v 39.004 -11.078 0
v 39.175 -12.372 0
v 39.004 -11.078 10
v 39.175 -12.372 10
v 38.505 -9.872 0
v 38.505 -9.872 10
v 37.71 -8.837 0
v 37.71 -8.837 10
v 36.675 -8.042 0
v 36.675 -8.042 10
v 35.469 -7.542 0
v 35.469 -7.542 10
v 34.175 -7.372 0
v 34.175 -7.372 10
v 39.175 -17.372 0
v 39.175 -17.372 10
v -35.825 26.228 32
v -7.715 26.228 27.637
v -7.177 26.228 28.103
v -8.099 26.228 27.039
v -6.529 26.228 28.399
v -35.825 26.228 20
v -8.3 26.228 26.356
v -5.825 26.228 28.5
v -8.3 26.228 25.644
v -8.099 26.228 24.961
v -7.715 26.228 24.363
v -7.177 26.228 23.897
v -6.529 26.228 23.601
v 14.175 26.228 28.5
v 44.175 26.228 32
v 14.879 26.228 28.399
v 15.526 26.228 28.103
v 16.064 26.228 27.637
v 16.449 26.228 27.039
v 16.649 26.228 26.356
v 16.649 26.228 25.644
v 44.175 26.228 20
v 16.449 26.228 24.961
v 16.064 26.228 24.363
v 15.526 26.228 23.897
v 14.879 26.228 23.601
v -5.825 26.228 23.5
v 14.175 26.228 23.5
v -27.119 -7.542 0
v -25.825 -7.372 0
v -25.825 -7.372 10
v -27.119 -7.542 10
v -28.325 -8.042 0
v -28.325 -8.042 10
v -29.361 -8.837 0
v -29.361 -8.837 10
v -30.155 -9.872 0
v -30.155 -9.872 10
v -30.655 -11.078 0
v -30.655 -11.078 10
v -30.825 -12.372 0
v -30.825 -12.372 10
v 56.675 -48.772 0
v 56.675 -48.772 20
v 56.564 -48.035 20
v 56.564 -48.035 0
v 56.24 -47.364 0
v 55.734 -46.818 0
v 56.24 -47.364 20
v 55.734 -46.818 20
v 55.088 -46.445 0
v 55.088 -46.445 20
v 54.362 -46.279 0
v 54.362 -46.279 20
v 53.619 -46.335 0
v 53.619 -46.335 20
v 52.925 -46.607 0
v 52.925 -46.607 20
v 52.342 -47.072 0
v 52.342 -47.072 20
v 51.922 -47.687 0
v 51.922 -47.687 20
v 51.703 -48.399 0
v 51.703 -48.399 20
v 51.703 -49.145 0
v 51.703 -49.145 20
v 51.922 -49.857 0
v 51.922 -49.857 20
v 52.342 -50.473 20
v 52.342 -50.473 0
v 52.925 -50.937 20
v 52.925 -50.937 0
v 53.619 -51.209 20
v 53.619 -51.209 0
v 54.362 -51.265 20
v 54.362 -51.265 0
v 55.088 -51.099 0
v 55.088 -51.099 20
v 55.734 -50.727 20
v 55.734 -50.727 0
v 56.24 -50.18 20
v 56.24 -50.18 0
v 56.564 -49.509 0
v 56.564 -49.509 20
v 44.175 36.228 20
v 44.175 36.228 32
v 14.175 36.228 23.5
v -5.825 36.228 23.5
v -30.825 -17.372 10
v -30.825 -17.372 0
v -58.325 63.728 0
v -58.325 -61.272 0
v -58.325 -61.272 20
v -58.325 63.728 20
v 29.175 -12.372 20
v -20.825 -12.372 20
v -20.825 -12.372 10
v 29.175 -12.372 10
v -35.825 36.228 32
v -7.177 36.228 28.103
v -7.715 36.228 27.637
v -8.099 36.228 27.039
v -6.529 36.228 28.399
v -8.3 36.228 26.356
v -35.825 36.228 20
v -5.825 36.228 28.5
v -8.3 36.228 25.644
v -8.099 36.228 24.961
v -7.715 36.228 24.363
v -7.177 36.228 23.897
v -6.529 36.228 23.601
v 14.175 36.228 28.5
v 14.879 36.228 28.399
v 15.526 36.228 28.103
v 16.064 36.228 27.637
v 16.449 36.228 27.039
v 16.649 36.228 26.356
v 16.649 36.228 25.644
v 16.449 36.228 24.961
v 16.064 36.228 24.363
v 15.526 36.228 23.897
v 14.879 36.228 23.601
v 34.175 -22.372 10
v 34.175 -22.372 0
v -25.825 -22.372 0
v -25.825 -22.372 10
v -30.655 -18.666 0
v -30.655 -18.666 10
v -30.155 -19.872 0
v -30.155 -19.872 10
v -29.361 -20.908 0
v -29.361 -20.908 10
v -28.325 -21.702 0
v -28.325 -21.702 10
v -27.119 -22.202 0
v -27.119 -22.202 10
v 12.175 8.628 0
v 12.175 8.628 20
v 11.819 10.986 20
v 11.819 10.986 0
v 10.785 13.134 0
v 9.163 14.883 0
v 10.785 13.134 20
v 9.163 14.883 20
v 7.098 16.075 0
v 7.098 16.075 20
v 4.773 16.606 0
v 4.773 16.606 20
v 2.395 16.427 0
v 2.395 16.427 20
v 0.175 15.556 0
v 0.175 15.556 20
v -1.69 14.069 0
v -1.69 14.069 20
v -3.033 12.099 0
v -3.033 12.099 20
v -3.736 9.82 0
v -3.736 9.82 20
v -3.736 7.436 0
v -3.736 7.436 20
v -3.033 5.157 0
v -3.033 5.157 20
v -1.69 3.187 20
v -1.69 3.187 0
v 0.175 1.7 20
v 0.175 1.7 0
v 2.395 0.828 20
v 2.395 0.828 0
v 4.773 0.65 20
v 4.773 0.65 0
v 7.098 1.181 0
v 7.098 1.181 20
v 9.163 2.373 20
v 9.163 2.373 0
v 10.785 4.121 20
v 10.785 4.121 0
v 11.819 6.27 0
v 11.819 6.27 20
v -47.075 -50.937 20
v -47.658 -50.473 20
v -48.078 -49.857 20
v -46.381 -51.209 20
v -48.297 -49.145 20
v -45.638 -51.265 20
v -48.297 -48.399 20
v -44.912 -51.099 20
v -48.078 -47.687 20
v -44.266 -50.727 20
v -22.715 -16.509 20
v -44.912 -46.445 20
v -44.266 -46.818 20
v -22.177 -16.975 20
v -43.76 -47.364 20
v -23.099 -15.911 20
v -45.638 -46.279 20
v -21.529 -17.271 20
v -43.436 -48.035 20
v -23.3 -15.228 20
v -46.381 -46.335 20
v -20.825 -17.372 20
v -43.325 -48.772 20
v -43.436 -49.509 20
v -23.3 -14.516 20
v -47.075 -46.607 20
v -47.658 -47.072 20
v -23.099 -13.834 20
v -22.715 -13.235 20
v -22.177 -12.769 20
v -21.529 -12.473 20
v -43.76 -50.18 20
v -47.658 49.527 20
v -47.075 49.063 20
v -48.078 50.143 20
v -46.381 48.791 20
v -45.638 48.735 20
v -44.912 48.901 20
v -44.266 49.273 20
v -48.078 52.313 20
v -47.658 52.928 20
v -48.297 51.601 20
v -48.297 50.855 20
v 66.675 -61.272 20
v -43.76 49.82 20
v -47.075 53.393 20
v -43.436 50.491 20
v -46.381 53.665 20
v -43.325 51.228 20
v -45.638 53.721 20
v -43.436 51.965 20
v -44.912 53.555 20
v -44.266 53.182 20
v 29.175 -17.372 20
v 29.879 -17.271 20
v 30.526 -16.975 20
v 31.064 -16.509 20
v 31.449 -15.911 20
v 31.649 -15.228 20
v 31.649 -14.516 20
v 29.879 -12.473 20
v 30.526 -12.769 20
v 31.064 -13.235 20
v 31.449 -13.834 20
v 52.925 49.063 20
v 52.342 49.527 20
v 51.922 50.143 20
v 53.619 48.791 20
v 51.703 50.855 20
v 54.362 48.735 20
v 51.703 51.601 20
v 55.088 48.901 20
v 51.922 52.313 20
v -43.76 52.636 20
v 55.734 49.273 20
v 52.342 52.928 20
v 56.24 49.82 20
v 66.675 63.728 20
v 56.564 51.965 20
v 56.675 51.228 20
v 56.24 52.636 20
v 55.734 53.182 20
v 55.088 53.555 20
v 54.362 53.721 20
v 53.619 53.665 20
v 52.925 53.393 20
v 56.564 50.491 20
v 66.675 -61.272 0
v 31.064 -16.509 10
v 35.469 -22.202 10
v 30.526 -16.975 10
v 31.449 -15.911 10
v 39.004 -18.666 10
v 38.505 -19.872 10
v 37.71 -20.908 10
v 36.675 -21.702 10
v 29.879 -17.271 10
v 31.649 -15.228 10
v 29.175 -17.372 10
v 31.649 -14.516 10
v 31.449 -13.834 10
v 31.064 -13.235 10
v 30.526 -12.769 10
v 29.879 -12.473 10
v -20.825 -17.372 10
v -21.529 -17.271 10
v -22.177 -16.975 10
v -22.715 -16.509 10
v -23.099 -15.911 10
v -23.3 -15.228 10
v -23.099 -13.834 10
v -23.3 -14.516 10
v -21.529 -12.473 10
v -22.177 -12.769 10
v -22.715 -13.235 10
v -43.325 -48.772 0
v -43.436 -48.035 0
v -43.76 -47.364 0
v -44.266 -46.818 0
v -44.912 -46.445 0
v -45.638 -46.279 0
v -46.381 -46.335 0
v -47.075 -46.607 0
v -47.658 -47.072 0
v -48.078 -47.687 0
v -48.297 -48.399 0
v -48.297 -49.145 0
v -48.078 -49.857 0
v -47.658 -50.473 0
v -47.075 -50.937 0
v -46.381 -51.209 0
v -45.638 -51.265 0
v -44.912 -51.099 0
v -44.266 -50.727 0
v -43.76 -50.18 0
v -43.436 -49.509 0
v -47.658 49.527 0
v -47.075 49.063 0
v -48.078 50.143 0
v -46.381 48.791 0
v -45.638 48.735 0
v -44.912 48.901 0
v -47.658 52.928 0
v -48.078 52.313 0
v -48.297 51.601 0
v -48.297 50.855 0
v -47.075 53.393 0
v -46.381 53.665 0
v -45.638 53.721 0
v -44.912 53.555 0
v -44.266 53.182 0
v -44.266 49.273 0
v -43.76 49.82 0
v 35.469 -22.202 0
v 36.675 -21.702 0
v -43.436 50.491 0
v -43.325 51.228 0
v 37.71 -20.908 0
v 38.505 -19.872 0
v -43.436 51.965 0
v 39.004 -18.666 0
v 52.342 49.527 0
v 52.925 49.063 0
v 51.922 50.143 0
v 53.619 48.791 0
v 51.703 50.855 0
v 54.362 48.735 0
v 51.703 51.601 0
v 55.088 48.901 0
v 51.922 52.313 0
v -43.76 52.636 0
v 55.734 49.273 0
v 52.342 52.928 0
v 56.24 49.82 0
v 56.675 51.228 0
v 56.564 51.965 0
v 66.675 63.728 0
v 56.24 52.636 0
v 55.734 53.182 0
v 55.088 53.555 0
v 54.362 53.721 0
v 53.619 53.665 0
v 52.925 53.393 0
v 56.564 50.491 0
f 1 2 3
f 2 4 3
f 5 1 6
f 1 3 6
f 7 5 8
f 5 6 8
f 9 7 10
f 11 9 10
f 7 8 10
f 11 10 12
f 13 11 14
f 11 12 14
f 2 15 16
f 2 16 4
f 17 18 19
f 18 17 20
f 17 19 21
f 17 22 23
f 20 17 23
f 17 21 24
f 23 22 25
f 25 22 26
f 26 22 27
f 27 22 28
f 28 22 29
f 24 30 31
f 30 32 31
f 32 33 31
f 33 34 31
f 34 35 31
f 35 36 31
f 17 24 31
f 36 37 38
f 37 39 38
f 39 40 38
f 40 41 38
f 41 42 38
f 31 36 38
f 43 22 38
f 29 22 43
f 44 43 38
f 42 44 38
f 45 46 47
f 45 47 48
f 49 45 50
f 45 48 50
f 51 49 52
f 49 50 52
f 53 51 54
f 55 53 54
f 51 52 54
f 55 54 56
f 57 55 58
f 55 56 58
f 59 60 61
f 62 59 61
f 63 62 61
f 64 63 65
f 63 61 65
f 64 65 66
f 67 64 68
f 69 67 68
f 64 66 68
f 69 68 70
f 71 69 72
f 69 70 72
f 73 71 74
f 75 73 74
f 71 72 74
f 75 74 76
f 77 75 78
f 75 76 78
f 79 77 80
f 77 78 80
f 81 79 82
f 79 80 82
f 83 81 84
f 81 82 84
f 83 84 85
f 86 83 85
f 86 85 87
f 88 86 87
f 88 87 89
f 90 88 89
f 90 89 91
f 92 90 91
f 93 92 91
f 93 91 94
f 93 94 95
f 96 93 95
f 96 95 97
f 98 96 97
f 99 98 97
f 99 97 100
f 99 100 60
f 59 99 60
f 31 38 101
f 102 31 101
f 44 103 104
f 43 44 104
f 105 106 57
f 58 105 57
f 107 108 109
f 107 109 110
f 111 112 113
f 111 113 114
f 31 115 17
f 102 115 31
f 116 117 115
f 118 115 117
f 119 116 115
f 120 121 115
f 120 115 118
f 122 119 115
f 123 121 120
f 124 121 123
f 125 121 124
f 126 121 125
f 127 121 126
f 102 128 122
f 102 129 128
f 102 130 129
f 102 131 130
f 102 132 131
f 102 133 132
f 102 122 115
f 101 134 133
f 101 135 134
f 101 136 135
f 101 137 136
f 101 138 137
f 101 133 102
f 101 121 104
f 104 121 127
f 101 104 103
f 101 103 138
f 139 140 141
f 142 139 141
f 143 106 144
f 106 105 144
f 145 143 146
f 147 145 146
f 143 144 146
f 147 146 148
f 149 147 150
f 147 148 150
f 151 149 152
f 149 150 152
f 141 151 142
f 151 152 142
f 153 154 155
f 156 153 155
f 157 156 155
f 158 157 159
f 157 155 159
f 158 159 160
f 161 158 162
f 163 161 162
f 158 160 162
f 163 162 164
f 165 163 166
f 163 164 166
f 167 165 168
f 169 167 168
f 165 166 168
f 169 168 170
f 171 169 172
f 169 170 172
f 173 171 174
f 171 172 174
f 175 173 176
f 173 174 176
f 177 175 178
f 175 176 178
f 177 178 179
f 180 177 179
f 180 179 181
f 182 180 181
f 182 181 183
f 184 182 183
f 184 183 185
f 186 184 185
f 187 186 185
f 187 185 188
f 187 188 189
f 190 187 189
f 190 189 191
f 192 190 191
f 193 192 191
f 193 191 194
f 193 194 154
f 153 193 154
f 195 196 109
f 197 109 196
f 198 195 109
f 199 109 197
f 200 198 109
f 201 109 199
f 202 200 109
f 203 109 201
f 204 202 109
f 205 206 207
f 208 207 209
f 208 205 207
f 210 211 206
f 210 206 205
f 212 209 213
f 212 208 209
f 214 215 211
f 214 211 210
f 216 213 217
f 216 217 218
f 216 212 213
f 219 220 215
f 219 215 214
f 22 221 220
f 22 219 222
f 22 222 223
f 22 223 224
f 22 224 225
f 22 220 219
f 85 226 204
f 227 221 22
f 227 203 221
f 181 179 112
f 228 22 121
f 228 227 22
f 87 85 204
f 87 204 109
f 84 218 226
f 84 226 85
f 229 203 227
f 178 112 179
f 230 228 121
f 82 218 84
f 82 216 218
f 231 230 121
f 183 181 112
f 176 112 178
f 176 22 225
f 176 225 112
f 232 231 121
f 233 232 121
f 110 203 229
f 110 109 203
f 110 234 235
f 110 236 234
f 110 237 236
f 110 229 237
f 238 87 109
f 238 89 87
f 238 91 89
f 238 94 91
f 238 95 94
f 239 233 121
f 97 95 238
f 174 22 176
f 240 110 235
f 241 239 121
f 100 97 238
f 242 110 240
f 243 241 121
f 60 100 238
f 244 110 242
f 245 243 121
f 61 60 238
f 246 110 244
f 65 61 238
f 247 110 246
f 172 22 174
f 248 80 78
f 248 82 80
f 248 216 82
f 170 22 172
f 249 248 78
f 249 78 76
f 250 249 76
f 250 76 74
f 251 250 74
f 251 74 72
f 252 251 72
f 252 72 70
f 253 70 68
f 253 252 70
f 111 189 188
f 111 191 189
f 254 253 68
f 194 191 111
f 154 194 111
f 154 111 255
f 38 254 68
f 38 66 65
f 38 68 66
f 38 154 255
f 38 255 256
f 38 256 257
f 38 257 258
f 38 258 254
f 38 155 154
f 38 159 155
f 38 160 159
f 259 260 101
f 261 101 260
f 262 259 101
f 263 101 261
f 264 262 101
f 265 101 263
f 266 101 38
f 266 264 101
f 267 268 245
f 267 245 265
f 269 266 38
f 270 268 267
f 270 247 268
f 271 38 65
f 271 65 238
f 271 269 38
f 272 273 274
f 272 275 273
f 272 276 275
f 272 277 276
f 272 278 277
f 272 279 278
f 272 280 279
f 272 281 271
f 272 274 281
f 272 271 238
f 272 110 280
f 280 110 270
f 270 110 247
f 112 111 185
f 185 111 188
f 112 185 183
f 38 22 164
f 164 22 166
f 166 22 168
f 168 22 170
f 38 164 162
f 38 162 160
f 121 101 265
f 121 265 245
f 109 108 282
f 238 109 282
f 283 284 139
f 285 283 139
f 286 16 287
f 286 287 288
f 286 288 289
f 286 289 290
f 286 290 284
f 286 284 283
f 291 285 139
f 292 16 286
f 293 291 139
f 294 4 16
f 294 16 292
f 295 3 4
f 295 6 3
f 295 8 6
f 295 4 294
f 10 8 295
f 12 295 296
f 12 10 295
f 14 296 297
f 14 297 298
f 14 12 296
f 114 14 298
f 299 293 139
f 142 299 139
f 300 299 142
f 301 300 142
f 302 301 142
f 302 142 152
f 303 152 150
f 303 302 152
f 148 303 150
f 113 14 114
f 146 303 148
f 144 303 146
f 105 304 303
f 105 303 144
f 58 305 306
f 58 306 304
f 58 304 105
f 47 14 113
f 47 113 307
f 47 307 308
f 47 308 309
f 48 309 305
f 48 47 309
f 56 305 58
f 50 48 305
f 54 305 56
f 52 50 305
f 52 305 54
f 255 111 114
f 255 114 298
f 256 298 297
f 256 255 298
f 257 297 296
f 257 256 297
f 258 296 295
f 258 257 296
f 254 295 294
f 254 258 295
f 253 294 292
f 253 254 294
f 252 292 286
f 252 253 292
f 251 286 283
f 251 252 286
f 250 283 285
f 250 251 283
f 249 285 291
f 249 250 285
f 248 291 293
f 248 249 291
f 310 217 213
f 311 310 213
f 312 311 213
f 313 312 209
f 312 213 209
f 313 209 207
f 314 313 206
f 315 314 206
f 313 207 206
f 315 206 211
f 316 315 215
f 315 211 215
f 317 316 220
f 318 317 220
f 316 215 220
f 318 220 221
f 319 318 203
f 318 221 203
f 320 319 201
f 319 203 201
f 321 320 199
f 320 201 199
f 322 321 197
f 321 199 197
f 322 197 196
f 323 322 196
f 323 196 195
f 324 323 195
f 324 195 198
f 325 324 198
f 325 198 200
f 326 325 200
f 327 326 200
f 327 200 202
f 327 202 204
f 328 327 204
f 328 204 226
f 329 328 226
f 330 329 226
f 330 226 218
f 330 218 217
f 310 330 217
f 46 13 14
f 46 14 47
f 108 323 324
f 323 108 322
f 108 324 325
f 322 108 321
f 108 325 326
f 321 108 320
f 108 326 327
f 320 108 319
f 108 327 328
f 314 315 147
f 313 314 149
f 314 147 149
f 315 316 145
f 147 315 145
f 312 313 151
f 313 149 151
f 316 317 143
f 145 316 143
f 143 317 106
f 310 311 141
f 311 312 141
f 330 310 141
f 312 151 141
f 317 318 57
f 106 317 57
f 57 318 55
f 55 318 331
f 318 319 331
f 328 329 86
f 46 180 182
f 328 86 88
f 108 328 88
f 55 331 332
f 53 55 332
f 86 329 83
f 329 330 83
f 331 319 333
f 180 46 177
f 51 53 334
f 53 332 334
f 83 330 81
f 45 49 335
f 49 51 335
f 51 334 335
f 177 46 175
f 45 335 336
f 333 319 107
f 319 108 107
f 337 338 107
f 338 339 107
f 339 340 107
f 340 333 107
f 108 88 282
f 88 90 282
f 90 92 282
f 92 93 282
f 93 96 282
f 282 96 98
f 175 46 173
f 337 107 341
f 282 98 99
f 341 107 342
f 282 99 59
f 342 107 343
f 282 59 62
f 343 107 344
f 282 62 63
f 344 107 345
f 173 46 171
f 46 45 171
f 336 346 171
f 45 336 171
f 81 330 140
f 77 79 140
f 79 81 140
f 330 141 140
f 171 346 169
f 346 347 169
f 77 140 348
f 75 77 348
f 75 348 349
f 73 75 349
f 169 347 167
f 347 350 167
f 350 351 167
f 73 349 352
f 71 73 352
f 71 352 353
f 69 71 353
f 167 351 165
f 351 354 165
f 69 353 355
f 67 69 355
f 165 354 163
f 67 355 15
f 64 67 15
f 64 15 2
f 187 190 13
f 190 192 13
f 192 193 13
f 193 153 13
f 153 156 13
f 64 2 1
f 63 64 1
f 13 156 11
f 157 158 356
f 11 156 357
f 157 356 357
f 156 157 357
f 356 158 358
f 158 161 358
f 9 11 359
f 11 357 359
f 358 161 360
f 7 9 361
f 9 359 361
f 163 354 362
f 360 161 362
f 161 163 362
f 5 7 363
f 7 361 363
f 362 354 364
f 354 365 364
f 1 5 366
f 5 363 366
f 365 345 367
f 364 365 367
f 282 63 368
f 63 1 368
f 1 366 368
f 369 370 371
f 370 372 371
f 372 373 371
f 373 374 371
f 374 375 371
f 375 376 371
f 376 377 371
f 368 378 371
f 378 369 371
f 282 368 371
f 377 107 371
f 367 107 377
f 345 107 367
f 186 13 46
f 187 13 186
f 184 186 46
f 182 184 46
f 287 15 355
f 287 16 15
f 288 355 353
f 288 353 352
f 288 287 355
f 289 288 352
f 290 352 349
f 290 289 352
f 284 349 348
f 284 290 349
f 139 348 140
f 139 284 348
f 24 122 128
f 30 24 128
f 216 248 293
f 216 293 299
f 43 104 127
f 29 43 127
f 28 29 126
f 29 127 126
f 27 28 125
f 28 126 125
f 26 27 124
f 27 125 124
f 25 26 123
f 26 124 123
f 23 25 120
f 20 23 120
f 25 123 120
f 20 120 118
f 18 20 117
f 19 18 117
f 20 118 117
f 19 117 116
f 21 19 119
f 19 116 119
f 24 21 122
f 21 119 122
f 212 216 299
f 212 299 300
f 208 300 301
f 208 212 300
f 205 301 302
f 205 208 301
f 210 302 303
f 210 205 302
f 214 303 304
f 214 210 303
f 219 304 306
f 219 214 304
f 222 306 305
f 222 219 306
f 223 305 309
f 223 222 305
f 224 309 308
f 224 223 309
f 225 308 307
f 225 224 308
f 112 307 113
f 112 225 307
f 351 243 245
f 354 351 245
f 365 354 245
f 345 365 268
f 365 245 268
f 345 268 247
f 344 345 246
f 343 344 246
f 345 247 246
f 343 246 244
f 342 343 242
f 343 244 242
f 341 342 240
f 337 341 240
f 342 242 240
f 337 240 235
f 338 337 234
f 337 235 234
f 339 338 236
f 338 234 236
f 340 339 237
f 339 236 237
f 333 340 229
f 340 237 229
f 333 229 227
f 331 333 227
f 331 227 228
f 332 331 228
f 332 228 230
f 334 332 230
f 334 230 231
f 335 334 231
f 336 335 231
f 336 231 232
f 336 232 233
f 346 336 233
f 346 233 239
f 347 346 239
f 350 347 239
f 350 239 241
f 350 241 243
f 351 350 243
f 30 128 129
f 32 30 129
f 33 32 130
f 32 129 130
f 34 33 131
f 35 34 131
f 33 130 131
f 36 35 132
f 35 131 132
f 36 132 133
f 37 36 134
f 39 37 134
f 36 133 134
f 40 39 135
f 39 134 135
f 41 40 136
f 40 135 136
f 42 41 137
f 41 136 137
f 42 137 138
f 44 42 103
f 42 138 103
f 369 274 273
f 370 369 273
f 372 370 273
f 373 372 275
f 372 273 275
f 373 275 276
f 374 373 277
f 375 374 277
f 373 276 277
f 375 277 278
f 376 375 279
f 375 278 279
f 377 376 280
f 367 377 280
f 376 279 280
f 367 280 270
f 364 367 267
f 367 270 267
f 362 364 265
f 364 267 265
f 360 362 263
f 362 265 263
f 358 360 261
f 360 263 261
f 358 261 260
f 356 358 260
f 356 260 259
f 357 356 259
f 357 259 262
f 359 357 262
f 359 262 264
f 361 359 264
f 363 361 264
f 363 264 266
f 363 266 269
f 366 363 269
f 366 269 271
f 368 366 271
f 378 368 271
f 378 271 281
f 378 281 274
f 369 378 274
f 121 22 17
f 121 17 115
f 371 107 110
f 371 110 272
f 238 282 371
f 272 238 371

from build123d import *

# Parameters (mm, degrees)
SKETCH1_W           = 125
SKETCH1_H           = 125
BOSS_EXTRUDE1_DEPTH = 20
SKETCH2_R           = 2.5
CUT_EXTRUDE1_DEPTH  = 95.375743383
SKETCH3_R           = 8
CUT_EXTRUDE2_DEPTH  = 95.375743383
SKETCH4_W           = 70
SKETCH4_H           = 15
CUT_EXTRUDE3_DEPTH  = 10
FILLET1_R           = 5
SKETCH6_W           = 80
SKETCH6_H           = 10
BOSS_EXTRUDE2_DEPTH = 12
CUT_EXTRUDE4_DEPTH  = 123.375593875


with BuildPart() as part:
    # Sketch1 → Boss-Extrude1 (new body)
    with BuildSketch(Plane.XY):
        with Locations((4.174852652, 1.227897839)):
            Rectangle(SKETCH1_W, SKETCH1_H)
    extrude(amount=BOSS_EXTRUDE1_DEPTH)

    # Sketch2 → Cut-Extrude1 (cut, through all)
    with BuildSketch(Plane.XY.offset(20)):
        with Locations((-45.825147348, 51.227897839)):
            Circle(SKETCH2_R)
        with Locations((54.174852652, 51.227897839)):
            Circle(SKETCH2_R)
        with Locations((54.174852652, -48.772102161)):
            Circle(SKETCH2_R)
        with Locations((-45.825147348, -48.772102161)):
            Circle(SKETCH2_R)
    extrude(amount=-CUT_EXTRUDE1_DEPTH, mode=Mode.SUBTRACT)

    # Sketch3 → Cut-Extrude2 (cut, through all)
    with BuildSketch(Plane.XY.offset(20)):
        with Locations((4.174852652, 8.627897839)):
            Circle(SKETCH3_R)
        with BuildLine():
            Line((-20.825147348, -12.372102161), (29.174852652, -12.372102161))
            ThreePointArc((29.174852652, -12.372102161), (31.674852652, -14.872102161), (29.174852652, -17.372102161))
            Line((29.174852652, -17.372102161), (-20.825147348, -17.372102161))
            ThreePointArc((-20.825147348, -17.372102161), (-23.325147348, -14.872102161), (-20.825147348, -12.372102161))
        make_face()
    extrude(amount=-CUT_EXTRUDE2_DEPTH, mode=Mode.SUBTRACT)

    # Sketch4 → Cut-Extrude3 (cut)
    with BuildSketch(Plane(origin=(0, 0, 0), x_dir=(-1, 0, 0), z_dir=(0, 0, -1))):
        with Locations((-4.174852652, -14.872102161)):
            Rectangle(SKETCH4_W, SKETCH4_H)
    extrude(amount=-CUT_EXTRUDE3_DEPTH, mode=Mode.SUBTRACT)

    # Fillet1
    fillet1_edges = [part.edges().sort_by_distance(p)[0] for p in [
        (39.174852652, -22.372102161, 5),
        (39.174852652, -7.372102161, 5),
        (-30.825147348, -7.372102161, 5),
        (-30.825147348, -22.372102161, 5),
    ]]
    fillet(fillet1_edges, radius=FILLET1_R)

    # Sketch6 → Boss-Extrude2 (add)
    with BuildSketch(Plane.XY.offset(20)):
        with Locations((4.174852652, 31.227897839)):
            Rectangle(SKETCH6_W, SKETCH6_H)
    extrude(amount=BOSS_EXTRUDE2_DEPTH)

    # Sketch7 → Cut-Extrude4 (cut, through all)
    with BuildSketch(Plane(origin=(0, 36.227897839, 0), x_dir=(1, 0, 0), z_dir=(0, 1, 0))):
        with BuildLine():
            Line((-5.825147348, -28.5), (14.174852652, -28.5))
            ThreePointArc((14.174852652, -28.5), (16.674852652, -26), (14.174852652, -23.5))
            Line((14.174852652, -23.5), (-5.825147348, -23.5))
            ThreePointArc((-5.825147348, -23.5), (-8.325147348, -26), (-5.825147348, -28.5))
        make_face()
    extrude(amount=-CUT_EXTRUDE4_DEPTH, mode=Mode.SUBTRACT)


solid = part.part
